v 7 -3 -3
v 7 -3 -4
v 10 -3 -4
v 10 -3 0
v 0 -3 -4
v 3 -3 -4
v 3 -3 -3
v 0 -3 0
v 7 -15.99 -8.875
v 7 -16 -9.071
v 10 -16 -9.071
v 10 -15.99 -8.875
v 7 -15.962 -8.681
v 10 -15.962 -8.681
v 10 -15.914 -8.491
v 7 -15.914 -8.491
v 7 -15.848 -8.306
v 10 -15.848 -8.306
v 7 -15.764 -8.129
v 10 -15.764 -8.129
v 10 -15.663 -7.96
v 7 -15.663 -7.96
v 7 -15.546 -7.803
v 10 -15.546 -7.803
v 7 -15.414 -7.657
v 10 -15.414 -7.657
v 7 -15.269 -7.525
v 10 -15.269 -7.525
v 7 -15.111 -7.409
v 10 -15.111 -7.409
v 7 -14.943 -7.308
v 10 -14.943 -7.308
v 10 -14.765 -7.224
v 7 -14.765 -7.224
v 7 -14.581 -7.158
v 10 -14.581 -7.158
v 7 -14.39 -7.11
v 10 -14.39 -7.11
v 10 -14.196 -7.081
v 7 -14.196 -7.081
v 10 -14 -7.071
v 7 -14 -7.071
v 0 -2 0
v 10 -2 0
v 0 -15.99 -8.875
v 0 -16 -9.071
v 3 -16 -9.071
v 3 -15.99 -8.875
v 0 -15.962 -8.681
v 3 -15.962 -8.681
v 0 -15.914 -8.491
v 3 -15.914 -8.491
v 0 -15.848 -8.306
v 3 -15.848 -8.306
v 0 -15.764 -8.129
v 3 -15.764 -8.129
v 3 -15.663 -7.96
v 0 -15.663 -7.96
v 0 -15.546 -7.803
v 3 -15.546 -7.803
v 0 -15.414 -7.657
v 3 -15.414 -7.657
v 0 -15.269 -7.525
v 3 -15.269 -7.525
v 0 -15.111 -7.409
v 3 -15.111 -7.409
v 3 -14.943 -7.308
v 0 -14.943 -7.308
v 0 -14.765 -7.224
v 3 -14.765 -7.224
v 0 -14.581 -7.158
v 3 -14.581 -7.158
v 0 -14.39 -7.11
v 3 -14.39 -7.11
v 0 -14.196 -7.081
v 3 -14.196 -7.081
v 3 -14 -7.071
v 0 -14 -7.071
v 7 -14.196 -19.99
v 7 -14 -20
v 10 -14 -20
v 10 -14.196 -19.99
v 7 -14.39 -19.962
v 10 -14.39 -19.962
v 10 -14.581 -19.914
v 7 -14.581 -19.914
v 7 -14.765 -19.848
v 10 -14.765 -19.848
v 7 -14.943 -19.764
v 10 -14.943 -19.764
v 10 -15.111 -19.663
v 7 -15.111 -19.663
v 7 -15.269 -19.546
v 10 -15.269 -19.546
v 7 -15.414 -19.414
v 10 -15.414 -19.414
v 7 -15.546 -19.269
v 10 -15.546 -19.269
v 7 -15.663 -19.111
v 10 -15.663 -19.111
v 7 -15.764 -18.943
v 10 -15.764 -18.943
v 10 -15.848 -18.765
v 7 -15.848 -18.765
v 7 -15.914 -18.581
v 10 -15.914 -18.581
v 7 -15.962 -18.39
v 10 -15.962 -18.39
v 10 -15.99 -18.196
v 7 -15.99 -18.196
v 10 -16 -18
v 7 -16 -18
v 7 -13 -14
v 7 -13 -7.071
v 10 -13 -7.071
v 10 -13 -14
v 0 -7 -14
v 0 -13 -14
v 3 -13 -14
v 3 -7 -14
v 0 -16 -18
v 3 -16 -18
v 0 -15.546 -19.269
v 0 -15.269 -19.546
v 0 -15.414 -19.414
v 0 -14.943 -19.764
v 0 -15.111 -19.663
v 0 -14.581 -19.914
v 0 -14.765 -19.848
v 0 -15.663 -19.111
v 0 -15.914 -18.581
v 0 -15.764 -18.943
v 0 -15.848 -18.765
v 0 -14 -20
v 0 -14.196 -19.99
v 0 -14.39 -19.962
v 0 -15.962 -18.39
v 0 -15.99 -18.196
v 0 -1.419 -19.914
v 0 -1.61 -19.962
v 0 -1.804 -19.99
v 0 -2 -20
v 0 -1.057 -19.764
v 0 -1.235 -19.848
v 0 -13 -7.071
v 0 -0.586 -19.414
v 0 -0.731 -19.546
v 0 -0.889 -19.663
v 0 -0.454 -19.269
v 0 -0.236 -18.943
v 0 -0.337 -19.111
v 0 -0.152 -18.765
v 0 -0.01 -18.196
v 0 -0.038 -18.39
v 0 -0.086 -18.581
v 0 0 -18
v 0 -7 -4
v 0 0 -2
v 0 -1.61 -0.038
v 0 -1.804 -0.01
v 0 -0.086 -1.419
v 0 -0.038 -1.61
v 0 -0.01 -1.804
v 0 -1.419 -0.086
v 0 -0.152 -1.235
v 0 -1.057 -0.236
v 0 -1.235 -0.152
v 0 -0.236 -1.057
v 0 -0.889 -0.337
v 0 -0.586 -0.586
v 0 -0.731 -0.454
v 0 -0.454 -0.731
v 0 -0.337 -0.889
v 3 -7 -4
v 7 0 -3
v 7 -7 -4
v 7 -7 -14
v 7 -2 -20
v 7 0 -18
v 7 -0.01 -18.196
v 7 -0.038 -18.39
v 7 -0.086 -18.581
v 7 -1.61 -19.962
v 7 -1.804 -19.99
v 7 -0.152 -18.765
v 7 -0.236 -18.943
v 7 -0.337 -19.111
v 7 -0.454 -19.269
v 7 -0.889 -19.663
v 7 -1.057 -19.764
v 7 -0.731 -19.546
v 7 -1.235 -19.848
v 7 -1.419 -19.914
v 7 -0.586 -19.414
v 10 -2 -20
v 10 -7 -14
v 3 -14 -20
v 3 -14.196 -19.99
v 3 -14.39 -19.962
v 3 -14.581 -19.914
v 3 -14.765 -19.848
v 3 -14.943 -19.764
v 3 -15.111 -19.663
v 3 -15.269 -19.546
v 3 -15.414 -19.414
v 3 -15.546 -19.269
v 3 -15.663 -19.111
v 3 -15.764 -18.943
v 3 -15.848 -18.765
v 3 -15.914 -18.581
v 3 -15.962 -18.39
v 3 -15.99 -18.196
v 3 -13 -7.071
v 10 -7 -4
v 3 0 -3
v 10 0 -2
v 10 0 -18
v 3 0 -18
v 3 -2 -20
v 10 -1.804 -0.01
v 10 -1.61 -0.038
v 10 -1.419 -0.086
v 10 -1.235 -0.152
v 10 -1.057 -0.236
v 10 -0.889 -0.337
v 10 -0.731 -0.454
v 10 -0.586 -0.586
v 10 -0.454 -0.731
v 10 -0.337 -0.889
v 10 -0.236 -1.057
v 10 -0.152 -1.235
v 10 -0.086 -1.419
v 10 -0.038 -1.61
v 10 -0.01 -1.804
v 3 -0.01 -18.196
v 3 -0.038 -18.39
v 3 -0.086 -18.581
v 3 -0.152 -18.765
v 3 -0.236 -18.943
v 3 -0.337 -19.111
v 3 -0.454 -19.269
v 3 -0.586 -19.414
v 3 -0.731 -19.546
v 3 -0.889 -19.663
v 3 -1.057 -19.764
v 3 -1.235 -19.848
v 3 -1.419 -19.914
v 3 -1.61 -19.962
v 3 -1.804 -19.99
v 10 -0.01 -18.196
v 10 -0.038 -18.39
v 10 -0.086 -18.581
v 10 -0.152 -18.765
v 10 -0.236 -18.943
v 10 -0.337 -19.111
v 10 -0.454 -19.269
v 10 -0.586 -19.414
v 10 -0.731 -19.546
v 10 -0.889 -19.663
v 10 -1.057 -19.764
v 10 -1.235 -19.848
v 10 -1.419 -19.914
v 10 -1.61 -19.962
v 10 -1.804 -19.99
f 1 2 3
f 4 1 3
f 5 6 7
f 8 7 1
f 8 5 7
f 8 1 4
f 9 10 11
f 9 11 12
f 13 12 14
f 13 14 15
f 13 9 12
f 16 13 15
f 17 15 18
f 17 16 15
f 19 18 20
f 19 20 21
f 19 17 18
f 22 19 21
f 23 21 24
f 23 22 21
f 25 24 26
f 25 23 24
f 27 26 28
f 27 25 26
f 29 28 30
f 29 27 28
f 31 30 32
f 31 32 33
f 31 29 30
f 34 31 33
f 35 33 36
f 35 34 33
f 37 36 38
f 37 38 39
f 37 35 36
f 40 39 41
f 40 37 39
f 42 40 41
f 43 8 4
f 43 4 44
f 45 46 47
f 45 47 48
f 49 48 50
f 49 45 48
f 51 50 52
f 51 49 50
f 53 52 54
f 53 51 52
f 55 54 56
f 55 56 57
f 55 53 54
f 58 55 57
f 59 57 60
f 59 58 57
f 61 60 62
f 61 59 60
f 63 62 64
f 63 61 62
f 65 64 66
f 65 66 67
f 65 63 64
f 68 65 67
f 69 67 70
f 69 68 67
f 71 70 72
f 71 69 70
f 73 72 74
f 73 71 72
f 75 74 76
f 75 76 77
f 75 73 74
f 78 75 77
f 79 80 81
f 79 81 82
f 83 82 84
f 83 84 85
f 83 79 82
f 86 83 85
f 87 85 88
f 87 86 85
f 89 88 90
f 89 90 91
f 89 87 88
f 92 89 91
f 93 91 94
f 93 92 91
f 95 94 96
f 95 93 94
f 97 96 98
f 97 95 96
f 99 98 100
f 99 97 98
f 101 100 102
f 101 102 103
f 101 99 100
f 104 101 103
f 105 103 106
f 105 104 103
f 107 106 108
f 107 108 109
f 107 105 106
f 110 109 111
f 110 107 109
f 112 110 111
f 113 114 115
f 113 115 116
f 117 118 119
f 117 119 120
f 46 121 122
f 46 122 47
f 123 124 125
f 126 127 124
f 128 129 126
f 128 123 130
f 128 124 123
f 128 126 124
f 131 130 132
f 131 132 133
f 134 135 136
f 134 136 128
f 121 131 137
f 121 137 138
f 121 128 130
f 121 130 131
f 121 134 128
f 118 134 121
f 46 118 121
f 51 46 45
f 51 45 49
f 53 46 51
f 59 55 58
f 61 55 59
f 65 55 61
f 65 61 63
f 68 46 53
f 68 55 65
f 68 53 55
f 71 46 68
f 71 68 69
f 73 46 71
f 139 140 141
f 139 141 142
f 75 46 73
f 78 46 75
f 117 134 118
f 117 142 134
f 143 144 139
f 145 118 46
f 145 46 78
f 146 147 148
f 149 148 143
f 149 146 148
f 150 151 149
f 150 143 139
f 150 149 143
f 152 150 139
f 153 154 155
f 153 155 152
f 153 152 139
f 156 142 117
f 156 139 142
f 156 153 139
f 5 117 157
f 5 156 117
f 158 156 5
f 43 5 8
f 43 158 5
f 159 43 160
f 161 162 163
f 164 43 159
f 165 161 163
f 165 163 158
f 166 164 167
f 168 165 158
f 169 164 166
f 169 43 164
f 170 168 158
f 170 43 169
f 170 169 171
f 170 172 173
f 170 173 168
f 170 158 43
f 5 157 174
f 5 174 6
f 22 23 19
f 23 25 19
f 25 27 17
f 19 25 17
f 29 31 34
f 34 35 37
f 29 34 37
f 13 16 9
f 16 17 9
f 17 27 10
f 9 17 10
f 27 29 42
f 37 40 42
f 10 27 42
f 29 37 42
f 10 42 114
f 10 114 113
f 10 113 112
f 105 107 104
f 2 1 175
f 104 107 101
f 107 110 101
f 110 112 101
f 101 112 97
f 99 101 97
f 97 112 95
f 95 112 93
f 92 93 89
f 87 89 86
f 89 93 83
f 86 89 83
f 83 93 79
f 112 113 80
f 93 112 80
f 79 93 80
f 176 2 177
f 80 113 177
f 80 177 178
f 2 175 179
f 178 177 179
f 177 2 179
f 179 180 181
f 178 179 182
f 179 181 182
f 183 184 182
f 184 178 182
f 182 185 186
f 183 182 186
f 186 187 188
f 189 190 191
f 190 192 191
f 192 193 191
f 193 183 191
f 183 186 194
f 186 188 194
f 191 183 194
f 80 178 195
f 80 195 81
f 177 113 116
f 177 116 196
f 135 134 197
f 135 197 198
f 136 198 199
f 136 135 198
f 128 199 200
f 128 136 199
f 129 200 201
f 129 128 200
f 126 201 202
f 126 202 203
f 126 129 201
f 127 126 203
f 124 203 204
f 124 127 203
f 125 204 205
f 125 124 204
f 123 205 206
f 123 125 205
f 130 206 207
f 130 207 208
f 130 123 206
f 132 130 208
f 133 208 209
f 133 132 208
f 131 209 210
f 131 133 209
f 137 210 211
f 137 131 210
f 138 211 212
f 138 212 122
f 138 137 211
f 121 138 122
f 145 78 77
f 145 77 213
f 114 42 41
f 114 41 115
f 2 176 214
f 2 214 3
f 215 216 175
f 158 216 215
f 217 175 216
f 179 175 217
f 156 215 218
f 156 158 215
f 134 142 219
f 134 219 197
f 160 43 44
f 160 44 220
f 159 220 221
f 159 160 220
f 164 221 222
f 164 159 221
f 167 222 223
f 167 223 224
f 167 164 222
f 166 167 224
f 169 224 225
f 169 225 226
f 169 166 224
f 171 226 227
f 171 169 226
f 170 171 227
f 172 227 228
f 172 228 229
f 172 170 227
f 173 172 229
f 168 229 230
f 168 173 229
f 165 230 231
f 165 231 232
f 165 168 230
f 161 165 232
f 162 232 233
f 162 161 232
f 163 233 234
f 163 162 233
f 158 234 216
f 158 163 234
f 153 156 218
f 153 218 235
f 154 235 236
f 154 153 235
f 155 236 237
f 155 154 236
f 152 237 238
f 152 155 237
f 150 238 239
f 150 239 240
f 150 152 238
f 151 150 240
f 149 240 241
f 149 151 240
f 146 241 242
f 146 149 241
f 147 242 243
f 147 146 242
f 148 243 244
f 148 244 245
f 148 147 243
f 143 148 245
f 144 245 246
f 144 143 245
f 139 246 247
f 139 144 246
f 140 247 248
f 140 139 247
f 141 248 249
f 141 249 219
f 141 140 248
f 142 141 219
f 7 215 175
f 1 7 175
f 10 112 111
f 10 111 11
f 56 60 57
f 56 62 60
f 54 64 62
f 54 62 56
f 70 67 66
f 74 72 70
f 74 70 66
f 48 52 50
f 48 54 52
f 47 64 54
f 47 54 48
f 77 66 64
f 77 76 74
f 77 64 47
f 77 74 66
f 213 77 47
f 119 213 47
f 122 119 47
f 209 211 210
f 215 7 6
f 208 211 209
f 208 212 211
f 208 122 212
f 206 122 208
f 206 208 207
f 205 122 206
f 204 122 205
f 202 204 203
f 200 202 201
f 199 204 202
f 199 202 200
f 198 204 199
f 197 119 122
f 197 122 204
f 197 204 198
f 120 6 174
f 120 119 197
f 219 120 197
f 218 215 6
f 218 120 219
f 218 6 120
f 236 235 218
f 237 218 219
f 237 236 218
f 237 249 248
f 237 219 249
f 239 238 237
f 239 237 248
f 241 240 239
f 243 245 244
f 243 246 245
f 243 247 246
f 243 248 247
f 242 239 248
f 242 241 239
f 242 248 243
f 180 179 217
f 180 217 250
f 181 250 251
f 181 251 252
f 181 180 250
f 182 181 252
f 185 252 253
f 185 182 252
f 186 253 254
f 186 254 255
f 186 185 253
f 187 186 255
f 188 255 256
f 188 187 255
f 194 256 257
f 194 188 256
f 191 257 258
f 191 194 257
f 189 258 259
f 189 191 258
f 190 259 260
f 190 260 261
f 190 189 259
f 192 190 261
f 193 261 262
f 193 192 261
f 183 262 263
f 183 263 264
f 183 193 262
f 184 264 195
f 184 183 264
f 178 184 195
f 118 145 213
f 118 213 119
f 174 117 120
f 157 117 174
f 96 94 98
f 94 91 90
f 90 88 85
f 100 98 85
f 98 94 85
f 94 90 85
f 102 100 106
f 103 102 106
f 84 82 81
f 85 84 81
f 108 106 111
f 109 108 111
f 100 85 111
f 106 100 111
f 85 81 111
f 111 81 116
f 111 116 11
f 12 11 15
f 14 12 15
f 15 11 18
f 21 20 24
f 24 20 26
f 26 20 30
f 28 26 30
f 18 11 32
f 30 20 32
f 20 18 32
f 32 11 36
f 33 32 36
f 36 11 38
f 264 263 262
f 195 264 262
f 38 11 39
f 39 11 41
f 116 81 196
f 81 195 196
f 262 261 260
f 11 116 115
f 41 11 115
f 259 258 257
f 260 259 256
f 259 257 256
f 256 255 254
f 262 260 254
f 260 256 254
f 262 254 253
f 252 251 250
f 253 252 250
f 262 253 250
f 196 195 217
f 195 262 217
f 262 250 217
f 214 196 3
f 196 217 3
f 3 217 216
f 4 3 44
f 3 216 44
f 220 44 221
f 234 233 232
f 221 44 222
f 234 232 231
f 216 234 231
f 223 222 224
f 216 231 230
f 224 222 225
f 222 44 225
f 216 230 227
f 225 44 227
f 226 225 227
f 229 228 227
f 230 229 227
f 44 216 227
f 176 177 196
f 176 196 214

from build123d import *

# Parameters (mm, degrees)
EXTRUDE_1_DEPTH     = 10
SKETCH_2_W          = 4
SKETCH_2_H          = 17
CUT_EXTRUDE_1_DEPTH = 28.49545417


with BuildPart() as part:
    # 草图1 → 凸台-拉伸1 (new body)
    with BuildSketch(Plane(origin=(0, 0, 0), x_dir=(0, 0, -1), z_dir=(1, 0, 0))):
        with BuildLine():
            Line((2, 0), (18, 0))
            ThreePointArc((18, 0), (19.414213562, -0.585786438), (20, -2))
            Line((20, -2), (20, -14))
            ThreePointArc((20, -14), (19.414213562, -15.414213562), (18, -16))
            Line((18, -16), (9.071485189, -16))
            ThreePointArc((9.071485189, -16), (7.657271627, -15.414213562), (7.071485189, -14))
            Line((7.071485189, -14), (7.071485189, -13))
            Line((7.071485189, -13), (14, -13))
            Line((14, -13), (14, -7))
            Line((14, -7), (4, -7))
            Line((4, -7), (4, -3))
            Line((4, -3), (0, -3))
            Line((0, -3), (0, -2))
            ThreePointArc((0, -2), (0.585786438, -0.585786438), (2, 0))
        make_face()
    extrude(amount=EXTRUDE_1_DEPTH)

    # 草图2 → 切除-拉伸1 (cut, through all)
    with BuildSketch(Plane(origin=(0, 0, 0), x_dir=(1, 0, 0), z_dir=(0, 1, 0))):
        with Locations((5, 11.5)):
            Rectangle(SKETCH_2_W, SKETCH_2_H)
    extrude(amount=-CUT_EXTRUDE_1_DEPTH, mode=Mode.SUBTRACT)


solid = part.part
